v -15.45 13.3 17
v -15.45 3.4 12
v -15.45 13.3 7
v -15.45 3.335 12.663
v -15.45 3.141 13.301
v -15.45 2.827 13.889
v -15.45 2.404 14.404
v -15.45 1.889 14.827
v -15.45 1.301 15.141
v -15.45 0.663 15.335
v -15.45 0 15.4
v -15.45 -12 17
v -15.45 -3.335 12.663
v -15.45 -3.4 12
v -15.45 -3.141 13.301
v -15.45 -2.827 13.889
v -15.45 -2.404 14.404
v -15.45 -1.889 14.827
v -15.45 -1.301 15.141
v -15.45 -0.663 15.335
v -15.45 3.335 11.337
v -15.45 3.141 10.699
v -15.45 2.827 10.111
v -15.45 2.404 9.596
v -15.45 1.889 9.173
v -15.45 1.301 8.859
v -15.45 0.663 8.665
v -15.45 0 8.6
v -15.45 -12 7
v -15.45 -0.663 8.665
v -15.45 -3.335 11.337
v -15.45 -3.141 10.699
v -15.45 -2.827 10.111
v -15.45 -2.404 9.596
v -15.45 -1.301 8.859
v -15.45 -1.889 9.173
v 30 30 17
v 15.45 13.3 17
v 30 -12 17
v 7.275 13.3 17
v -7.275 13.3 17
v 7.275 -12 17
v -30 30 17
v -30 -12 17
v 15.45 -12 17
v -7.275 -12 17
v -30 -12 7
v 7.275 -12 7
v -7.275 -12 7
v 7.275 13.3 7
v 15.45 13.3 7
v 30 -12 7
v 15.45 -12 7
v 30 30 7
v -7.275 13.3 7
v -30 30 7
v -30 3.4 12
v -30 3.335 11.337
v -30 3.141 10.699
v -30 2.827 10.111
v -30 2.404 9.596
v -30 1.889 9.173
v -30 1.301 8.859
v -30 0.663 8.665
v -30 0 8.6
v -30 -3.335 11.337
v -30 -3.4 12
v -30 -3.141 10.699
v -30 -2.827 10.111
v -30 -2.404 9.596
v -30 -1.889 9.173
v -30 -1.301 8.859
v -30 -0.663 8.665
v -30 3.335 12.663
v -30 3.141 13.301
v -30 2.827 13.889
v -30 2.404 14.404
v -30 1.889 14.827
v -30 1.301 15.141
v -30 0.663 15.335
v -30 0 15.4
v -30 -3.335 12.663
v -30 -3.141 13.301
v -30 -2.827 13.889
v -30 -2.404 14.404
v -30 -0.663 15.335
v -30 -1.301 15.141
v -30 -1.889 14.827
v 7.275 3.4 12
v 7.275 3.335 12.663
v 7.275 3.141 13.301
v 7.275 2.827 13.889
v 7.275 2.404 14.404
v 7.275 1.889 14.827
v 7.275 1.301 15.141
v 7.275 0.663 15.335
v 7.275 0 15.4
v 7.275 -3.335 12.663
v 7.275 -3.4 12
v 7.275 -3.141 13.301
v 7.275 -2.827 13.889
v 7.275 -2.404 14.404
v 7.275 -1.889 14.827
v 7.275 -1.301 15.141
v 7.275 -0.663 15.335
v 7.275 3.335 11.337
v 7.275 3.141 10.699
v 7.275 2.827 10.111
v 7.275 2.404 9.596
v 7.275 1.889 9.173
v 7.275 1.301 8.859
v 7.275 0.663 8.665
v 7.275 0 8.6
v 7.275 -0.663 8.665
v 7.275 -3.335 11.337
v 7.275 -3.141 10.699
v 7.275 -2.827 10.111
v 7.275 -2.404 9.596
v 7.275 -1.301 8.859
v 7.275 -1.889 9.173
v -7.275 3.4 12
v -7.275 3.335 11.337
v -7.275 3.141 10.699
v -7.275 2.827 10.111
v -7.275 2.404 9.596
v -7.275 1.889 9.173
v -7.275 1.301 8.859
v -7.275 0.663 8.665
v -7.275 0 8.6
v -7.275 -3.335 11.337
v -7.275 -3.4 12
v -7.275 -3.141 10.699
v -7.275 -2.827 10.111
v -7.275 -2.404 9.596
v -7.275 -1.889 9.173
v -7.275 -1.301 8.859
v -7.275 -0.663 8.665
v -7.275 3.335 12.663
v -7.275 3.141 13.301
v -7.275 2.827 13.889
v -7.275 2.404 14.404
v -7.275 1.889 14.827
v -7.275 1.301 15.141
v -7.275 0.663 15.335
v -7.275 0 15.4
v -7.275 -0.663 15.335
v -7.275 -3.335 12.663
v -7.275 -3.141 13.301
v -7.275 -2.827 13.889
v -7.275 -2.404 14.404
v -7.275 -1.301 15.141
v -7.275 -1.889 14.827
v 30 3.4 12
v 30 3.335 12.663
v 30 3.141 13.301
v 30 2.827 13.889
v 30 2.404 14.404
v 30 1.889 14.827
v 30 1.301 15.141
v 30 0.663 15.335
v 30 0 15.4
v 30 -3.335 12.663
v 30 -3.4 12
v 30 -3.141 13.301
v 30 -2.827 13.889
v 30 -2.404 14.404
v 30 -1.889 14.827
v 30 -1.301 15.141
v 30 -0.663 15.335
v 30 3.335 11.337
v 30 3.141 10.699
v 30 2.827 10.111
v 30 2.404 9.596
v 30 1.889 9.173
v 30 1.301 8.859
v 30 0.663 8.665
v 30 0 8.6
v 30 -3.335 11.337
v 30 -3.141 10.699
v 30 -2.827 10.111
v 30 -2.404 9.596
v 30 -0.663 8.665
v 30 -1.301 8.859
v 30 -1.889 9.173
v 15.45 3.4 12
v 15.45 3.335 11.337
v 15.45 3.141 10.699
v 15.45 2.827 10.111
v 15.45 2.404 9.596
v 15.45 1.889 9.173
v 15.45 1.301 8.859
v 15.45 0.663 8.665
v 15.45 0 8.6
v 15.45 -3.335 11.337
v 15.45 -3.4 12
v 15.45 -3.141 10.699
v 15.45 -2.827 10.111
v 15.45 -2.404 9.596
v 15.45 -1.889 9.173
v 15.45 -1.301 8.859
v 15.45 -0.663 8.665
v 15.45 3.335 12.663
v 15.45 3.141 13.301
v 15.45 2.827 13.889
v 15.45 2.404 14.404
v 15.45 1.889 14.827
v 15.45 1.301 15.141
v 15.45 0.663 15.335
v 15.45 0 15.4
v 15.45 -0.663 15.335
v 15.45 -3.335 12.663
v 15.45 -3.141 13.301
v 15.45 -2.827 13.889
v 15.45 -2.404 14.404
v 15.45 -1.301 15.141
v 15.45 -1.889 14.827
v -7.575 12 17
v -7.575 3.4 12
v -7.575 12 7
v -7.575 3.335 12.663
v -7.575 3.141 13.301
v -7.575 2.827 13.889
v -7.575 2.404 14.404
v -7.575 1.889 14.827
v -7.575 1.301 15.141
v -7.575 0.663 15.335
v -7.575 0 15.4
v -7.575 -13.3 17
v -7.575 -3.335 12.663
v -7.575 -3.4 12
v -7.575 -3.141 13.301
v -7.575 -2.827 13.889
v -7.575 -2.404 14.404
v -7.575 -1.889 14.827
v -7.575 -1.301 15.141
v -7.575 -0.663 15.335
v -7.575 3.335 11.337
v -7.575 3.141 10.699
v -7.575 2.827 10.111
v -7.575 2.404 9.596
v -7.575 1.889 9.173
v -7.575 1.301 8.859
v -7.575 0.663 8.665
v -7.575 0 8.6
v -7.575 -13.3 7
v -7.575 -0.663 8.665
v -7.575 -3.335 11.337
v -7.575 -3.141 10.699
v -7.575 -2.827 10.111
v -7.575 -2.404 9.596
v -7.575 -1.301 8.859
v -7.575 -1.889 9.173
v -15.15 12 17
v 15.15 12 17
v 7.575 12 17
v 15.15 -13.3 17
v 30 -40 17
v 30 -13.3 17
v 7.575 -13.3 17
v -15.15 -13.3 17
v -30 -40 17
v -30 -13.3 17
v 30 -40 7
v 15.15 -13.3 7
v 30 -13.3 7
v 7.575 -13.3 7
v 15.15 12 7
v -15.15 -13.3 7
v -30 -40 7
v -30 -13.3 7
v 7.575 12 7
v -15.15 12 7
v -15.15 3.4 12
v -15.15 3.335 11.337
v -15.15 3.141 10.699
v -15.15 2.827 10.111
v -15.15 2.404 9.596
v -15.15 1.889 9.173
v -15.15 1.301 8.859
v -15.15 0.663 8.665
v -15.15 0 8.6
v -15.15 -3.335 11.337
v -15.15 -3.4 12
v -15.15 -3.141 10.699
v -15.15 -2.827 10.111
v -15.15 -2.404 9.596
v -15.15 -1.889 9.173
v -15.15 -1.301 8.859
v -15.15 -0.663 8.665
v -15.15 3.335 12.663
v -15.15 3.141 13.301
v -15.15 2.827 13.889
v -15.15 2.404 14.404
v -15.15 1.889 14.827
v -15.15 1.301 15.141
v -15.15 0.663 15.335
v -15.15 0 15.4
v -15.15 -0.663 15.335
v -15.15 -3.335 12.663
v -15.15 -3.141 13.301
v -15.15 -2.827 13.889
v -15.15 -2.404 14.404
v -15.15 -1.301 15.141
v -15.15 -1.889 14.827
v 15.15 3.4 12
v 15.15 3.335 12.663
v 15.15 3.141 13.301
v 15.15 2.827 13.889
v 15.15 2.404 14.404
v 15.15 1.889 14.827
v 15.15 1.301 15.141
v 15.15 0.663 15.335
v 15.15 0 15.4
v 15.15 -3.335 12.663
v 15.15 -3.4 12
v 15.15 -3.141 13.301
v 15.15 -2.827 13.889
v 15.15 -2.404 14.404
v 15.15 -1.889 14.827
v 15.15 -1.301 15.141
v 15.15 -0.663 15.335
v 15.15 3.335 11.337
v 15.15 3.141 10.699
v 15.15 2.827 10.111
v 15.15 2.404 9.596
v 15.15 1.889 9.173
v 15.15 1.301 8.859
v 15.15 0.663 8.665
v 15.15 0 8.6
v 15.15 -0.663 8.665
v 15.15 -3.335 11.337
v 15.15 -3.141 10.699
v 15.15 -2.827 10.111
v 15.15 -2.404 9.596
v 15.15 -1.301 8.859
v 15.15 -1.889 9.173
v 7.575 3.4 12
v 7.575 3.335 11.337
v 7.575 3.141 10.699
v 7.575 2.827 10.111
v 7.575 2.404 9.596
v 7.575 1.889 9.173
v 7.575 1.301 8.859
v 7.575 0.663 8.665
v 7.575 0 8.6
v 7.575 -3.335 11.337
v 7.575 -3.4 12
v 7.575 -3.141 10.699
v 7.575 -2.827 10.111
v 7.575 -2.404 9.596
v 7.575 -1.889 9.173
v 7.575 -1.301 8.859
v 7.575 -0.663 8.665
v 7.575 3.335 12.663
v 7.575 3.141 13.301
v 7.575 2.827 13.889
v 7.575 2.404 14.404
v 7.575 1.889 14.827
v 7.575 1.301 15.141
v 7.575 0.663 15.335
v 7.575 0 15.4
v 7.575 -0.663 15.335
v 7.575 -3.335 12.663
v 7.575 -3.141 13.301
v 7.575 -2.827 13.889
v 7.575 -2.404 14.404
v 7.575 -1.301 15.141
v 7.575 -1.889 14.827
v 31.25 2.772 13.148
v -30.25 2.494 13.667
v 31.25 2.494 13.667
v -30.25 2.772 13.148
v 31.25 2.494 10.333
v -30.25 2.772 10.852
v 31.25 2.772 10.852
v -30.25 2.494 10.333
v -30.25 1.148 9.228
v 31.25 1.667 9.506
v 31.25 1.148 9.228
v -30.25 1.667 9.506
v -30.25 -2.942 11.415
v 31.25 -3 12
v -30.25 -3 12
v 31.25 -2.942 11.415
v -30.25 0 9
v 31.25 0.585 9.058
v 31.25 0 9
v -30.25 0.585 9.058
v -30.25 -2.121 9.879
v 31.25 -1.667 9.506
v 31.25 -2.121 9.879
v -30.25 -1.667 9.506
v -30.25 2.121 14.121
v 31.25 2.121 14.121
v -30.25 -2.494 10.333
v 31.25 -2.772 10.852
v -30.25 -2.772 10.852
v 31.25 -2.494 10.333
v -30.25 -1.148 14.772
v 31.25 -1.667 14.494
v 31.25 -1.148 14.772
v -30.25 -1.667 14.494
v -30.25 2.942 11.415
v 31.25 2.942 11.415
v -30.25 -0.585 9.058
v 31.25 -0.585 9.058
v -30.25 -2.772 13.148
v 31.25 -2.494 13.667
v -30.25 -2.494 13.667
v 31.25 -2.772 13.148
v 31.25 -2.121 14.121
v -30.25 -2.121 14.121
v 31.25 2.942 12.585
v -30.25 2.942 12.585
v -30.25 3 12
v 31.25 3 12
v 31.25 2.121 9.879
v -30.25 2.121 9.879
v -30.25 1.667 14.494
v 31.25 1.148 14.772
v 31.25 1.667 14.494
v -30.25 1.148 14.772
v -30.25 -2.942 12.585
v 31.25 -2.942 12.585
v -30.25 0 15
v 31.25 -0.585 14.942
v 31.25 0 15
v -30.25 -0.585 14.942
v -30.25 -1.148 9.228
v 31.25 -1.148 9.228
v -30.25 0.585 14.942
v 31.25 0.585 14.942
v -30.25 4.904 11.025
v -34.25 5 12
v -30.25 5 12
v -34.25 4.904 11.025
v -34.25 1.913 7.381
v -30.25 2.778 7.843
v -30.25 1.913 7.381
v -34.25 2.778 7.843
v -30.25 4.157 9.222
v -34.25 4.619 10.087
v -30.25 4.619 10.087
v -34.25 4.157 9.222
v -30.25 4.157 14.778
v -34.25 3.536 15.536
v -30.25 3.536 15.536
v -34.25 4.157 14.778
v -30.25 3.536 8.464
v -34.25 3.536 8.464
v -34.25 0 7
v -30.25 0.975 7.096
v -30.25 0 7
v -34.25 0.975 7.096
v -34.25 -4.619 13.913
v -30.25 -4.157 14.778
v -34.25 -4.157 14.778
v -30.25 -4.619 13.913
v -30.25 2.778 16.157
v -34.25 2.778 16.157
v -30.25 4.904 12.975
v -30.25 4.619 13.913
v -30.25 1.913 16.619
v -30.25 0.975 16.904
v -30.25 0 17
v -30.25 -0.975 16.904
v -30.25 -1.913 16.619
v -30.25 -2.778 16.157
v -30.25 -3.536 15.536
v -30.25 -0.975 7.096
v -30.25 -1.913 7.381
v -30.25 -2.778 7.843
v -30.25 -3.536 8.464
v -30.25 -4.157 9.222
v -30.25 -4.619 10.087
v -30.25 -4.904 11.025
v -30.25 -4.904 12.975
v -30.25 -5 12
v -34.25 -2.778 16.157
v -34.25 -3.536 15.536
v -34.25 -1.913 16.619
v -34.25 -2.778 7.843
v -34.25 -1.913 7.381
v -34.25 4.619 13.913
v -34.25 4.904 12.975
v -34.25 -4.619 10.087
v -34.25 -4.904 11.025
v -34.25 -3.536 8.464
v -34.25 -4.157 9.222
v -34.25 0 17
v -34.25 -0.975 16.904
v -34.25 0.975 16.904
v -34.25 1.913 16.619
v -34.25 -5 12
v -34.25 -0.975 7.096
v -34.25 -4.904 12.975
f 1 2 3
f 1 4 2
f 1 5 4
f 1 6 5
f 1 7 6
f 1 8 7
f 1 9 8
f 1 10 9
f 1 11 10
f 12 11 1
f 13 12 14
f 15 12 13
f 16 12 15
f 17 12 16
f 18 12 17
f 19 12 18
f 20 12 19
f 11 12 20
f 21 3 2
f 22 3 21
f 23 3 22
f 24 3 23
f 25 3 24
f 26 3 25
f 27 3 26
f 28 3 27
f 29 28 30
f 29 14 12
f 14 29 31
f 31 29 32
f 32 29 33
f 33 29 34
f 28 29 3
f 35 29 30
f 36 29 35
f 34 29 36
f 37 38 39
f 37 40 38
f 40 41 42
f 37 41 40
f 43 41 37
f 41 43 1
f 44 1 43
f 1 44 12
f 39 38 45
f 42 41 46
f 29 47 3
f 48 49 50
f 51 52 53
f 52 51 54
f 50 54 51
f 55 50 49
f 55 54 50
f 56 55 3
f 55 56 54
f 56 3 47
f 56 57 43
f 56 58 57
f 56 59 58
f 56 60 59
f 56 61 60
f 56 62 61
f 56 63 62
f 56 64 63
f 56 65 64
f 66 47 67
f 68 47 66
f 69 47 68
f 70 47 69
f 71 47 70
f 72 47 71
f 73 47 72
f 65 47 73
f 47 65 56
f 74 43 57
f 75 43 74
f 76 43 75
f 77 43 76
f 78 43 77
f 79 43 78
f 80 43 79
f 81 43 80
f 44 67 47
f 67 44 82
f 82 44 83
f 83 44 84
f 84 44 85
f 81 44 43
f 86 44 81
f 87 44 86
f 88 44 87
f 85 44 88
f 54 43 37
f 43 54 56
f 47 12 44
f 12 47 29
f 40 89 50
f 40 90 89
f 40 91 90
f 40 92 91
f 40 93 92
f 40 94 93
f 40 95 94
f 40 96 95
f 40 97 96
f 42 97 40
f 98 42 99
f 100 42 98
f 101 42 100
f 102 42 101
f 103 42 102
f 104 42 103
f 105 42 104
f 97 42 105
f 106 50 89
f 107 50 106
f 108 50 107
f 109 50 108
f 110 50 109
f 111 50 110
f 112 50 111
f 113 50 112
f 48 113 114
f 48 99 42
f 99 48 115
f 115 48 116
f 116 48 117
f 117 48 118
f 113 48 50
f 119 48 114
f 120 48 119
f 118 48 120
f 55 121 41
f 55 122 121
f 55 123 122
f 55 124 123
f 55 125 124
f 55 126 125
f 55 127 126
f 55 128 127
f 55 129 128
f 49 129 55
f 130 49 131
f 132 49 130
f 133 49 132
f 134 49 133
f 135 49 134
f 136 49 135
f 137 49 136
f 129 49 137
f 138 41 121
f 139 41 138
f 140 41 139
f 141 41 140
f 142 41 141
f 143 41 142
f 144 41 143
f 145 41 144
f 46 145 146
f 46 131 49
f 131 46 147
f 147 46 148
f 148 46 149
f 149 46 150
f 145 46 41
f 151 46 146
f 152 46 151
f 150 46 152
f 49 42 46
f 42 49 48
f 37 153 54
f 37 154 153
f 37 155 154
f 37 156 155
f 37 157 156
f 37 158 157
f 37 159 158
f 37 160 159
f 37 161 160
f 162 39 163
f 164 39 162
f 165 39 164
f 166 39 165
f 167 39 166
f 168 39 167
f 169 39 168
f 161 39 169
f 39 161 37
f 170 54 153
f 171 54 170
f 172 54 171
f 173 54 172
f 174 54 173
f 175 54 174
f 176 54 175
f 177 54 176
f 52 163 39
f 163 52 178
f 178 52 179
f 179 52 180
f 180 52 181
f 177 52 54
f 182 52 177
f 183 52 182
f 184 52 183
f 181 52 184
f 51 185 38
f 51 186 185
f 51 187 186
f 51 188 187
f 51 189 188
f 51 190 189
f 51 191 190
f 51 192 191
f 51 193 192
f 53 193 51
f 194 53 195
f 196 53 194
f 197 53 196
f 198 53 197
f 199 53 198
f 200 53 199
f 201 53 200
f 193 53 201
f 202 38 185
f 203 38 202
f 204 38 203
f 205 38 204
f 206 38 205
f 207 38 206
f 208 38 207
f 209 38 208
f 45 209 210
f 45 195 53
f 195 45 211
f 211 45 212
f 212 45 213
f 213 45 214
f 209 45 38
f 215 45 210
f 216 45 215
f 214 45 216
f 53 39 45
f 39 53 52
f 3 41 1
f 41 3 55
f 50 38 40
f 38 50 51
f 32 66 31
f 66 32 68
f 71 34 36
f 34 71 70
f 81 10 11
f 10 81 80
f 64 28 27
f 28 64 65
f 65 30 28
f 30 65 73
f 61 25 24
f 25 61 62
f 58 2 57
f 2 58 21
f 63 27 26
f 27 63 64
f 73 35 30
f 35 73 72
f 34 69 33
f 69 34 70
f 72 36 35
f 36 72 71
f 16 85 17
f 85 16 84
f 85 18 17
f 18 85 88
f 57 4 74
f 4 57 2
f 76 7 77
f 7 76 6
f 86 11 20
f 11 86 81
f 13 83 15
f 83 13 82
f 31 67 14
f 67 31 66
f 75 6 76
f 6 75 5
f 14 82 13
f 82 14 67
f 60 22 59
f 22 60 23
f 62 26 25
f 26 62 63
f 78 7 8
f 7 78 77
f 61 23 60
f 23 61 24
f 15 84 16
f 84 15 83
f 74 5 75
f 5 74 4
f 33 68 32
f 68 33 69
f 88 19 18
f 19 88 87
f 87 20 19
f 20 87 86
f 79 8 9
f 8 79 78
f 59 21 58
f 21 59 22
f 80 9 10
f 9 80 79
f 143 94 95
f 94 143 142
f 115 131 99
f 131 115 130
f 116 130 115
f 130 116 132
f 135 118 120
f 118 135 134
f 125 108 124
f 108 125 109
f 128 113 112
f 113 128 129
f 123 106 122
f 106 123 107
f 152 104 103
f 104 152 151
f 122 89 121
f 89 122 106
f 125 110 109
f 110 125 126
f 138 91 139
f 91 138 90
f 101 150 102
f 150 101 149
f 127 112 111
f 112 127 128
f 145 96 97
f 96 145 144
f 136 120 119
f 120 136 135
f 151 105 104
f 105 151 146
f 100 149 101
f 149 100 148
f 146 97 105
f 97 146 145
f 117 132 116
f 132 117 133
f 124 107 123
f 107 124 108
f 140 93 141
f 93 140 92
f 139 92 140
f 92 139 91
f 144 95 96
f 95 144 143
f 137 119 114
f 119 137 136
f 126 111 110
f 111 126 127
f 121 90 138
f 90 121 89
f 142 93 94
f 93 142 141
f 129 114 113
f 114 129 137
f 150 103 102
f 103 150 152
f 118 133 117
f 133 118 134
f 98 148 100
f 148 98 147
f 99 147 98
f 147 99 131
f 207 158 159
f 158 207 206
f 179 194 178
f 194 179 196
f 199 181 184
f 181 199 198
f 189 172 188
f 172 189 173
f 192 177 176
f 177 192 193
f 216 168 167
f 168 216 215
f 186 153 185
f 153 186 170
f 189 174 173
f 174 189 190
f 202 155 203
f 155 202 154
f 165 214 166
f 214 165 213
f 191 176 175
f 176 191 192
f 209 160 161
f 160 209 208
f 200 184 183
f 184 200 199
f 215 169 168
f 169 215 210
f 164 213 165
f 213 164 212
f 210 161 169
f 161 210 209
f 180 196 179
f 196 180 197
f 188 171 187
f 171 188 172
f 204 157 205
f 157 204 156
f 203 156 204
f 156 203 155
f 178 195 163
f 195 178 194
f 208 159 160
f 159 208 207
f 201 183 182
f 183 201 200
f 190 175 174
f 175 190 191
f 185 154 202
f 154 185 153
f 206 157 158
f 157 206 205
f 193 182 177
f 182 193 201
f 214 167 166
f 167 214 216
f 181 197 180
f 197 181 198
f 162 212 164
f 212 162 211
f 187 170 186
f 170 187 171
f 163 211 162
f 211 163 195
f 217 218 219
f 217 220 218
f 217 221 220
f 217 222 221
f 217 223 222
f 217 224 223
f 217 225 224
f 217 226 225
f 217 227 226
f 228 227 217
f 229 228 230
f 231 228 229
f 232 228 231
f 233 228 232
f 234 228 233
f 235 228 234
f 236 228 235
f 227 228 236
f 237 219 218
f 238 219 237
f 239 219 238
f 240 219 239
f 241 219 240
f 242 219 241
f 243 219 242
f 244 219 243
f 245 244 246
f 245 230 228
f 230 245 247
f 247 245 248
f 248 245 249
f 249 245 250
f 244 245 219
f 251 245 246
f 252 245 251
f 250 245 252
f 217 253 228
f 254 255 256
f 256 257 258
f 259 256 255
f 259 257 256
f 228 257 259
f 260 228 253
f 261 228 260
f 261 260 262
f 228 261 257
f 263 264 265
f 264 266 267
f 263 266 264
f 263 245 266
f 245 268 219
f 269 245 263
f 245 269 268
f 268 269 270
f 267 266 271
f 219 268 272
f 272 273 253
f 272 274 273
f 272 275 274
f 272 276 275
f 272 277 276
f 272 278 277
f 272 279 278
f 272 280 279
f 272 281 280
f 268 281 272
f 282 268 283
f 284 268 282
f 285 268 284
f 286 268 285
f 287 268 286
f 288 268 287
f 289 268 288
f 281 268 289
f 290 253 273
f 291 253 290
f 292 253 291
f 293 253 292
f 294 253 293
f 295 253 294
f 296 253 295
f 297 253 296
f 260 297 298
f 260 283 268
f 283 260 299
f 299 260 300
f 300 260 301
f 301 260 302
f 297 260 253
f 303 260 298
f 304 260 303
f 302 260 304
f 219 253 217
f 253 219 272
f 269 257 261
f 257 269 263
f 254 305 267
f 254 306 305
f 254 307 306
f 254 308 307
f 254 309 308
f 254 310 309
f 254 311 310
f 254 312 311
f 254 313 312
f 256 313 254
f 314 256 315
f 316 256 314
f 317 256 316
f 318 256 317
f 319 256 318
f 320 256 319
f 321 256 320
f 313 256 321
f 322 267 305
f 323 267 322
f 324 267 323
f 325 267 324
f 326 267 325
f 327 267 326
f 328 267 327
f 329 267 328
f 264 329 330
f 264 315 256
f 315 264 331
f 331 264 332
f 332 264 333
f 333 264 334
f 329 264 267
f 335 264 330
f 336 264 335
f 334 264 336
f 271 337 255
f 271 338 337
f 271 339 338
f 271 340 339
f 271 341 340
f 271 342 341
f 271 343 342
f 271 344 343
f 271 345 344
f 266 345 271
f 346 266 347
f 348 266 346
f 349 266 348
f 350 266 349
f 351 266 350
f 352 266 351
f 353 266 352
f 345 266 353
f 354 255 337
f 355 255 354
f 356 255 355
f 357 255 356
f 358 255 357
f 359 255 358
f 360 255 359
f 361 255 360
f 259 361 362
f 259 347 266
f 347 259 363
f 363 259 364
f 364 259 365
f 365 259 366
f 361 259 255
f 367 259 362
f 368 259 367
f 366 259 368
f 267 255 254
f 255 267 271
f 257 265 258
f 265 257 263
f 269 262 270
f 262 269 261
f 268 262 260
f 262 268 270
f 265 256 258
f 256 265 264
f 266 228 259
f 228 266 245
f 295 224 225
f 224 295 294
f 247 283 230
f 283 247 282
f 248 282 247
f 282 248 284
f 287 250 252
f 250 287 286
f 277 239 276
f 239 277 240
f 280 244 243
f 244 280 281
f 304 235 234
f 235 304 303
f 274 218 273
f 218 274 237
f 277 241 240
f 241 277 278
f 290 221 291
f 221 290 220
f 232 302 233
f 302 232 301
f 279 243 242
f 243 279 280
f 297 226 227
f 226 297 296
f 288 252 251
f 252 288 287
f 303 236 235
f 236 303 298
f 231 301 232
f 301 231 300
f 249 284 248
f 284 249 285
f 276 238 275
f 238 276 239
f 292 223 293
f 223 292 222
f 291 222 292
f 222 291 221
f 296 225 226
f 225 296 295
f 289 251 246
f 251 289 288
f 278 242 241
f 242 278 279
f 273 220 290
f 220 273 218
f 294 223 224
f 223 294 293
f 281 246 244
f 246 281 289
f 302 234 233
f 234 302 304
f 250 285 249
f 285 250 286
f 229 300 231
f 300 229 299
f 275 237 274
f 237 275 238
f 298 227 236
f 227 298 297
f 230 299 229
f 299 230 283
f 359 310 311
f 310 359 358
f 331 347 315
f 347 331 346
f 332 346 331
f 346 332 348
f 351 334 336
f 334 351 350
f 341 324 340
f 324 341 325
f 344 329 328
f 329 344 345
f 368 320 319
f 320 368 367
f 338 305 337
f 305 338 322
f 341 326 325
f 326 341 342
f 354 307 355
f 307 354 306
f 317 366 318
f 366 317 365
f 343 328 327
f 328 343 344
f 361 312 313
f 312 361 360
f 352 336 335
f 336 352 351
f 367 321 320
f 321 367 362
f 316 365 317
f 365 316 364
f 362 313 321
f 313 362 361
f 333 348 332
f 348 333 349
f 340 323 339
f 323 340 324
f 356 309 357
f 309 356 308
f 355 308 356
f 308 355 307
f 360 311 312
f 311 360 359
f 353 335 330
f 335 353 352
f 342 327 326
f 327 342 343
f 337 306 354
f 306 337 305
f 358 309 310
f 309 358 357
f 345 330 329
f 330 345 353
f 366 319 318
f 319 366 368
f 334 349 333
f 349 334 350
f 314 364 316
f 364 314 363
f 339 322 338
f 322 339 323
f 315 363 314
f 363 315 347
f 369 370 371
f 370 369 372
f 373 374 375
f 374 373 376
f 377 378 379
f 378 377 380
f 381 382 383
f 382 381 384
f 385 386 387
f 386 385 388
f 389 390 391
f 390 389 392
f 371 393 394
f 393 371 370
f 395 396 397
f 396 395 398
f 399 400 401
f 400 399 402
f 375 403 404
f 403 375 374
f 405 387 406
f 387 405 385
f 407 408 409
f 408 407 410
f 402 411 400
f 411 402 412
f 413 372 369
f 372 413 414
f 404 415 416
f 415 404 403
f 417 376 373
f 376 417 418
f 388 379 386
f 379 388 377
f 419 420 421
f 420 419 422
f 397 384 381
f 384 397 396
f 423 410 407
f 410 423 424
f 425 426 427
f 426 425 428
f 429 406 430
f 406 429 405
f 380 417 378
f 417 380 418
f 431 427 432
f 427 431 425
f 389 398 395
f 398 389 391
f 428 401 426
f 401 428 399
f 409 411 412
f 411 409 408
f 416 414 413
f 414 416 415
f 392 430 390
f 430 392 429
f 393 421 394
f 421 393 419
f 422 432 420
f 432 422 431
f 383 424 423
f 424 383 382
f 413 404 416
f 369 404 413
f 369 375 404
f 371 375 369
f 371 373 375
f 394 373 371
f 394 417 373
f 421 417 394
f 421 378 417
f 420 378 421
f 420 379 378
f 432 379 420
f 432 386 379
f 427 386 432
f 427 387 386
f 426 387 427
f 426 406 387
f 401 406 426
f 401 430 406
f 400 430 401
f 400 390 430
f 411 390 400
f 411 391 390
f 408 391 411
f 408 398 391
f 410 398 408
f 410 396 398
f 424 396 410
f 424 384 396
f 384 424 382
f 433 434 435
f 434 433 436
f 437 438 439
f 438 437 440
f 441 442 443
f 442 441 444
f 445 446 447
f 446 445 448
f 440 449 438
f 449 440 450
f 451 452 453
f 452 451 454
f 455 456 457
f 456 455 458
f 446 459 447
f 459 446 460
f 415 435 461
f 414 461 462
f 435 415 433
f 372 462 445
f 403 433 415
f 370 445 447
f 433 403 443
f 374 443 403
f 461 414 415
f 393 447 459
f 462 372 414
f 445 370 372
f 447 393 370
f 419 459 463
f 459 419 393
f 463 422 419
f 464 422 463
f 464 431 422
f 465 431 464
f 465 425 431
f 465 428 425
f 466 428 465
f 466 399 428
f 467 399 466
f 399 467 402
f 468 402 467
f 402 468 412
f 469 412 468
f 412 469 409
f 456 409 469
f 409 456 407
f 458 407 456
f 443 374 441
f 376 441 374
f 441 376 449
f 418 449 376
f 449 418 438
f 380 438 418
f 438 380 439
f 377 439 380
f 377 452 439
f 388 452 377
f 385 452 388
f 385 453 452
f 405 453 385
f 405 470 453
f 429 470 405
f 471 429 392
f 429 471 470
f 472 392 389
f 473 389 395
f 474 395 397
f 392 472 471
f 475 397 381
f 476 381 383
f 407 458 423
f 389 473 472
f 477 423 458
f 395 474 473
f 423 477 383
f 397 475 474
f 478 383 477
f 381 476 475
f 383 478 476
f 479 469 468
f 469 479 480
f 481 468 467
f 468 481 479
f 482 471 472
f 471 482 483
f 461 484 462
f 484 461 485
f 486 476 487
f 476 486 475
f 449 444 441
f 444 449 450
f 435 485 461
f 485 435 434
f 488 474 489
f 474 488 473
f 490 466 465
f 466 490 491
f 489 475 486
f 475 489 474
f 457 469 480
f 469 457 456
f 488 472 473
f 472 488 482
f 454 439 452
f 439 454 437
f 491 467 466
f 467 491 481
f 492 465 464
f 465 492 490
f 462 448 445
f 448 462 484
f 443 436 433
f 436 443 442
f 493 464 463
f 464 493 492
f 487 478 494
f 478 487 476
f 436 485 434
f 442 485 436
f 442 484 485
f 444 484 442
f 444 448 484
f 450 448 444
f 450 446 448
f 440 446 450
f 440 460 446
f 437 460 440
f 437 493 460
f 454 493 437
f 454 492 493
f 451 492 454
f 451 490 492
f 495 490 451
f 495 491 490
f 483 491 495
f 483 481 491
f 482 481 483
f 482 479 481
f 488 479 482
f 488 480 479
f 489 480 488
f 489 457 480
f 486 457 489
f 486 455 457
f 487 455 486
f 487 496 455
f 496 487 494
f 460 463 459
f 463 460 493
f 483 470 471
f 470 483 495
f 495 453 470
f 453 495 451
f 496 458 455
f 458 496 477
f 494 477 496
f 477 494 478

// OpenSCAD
$fn = 32;

// ------------------------------------------------------------------------
// Butt hinge: hinge 60 mm, leaf swung 0 deg
// Every part is its own module, assembly() places every instance.
// ------------------------------------------------------------------------

// --- part 1 ---
module hinge_base() {
  difference() {
    union() {
      translate([-30, -12, -5]) cube([14.55, 42, 10]);
      translate([-7.275, -12, -5]) cube([14.55, 42, 10]);
      translate([15.45, -12, -5]) cube([14.55, 42, 10]);
      translate([-30, 13.3, -5]) cube([60, 16.7, 10]);
    }
    translate([-22.725, 0, 0]) rotate([0, 90, 0]) cylinder(h = 16.55, d = 6.8, center = true);
    translate([0, 0, 0]) rotate([0, 90, 0]) cylinder(h = 16.55, d = 6.8, center = true);
    translate([22.725, 0, 0]) rotate([0, 90, 0]) cylinder(h = 16.55, d = 6.8, center = true);
  }
}

// --- part 2 ---
module hinge_mover() {
  difference() {
    union() {
      translate([-15.15, -40, -5]) cube([7.575, 52, 10]);
      translate([7.575, -40, -5]) cube([7.575, 52, 10]);
      translate([-30, -40, -5]) cube([60, 26.7, 10]);
    }
    translate([-11.362, 0, 0]) rotate([0, 90, 0]) cylinder(h = 9.575, d = 6.8, center = true);
    translate([11.362, 0, 0]) rotate([0, 90, 0]) cylinder(h = 9.575, d = 6.8, center = true);
  }
}

// --- part 3 ---
module hinge_pin() {
  rotate([0, 90, 0]) cylinder(h = 62.5, d = 6, center = true);
  translate([-34.25, 0, 0]) rotate([0, 90, 0]) cylinder(h = 4, d = 10);
}

// --- assembly ---
module assembly() {
  color([0.80, 0.24, 0.20]) translate([0, 0, 12]) rotate([0, 0, 0]) hinge_base();
  color([0.20, 0.45, 0.75]) translate([0, 0, 12]) rotate([0, 0, 0]) hinge_mover();
  color([0.25, 0.62, 0.32]) translate([0, 0, 12]) rotate([0, 0, 0]) hinge_pin();
}

assembly();
